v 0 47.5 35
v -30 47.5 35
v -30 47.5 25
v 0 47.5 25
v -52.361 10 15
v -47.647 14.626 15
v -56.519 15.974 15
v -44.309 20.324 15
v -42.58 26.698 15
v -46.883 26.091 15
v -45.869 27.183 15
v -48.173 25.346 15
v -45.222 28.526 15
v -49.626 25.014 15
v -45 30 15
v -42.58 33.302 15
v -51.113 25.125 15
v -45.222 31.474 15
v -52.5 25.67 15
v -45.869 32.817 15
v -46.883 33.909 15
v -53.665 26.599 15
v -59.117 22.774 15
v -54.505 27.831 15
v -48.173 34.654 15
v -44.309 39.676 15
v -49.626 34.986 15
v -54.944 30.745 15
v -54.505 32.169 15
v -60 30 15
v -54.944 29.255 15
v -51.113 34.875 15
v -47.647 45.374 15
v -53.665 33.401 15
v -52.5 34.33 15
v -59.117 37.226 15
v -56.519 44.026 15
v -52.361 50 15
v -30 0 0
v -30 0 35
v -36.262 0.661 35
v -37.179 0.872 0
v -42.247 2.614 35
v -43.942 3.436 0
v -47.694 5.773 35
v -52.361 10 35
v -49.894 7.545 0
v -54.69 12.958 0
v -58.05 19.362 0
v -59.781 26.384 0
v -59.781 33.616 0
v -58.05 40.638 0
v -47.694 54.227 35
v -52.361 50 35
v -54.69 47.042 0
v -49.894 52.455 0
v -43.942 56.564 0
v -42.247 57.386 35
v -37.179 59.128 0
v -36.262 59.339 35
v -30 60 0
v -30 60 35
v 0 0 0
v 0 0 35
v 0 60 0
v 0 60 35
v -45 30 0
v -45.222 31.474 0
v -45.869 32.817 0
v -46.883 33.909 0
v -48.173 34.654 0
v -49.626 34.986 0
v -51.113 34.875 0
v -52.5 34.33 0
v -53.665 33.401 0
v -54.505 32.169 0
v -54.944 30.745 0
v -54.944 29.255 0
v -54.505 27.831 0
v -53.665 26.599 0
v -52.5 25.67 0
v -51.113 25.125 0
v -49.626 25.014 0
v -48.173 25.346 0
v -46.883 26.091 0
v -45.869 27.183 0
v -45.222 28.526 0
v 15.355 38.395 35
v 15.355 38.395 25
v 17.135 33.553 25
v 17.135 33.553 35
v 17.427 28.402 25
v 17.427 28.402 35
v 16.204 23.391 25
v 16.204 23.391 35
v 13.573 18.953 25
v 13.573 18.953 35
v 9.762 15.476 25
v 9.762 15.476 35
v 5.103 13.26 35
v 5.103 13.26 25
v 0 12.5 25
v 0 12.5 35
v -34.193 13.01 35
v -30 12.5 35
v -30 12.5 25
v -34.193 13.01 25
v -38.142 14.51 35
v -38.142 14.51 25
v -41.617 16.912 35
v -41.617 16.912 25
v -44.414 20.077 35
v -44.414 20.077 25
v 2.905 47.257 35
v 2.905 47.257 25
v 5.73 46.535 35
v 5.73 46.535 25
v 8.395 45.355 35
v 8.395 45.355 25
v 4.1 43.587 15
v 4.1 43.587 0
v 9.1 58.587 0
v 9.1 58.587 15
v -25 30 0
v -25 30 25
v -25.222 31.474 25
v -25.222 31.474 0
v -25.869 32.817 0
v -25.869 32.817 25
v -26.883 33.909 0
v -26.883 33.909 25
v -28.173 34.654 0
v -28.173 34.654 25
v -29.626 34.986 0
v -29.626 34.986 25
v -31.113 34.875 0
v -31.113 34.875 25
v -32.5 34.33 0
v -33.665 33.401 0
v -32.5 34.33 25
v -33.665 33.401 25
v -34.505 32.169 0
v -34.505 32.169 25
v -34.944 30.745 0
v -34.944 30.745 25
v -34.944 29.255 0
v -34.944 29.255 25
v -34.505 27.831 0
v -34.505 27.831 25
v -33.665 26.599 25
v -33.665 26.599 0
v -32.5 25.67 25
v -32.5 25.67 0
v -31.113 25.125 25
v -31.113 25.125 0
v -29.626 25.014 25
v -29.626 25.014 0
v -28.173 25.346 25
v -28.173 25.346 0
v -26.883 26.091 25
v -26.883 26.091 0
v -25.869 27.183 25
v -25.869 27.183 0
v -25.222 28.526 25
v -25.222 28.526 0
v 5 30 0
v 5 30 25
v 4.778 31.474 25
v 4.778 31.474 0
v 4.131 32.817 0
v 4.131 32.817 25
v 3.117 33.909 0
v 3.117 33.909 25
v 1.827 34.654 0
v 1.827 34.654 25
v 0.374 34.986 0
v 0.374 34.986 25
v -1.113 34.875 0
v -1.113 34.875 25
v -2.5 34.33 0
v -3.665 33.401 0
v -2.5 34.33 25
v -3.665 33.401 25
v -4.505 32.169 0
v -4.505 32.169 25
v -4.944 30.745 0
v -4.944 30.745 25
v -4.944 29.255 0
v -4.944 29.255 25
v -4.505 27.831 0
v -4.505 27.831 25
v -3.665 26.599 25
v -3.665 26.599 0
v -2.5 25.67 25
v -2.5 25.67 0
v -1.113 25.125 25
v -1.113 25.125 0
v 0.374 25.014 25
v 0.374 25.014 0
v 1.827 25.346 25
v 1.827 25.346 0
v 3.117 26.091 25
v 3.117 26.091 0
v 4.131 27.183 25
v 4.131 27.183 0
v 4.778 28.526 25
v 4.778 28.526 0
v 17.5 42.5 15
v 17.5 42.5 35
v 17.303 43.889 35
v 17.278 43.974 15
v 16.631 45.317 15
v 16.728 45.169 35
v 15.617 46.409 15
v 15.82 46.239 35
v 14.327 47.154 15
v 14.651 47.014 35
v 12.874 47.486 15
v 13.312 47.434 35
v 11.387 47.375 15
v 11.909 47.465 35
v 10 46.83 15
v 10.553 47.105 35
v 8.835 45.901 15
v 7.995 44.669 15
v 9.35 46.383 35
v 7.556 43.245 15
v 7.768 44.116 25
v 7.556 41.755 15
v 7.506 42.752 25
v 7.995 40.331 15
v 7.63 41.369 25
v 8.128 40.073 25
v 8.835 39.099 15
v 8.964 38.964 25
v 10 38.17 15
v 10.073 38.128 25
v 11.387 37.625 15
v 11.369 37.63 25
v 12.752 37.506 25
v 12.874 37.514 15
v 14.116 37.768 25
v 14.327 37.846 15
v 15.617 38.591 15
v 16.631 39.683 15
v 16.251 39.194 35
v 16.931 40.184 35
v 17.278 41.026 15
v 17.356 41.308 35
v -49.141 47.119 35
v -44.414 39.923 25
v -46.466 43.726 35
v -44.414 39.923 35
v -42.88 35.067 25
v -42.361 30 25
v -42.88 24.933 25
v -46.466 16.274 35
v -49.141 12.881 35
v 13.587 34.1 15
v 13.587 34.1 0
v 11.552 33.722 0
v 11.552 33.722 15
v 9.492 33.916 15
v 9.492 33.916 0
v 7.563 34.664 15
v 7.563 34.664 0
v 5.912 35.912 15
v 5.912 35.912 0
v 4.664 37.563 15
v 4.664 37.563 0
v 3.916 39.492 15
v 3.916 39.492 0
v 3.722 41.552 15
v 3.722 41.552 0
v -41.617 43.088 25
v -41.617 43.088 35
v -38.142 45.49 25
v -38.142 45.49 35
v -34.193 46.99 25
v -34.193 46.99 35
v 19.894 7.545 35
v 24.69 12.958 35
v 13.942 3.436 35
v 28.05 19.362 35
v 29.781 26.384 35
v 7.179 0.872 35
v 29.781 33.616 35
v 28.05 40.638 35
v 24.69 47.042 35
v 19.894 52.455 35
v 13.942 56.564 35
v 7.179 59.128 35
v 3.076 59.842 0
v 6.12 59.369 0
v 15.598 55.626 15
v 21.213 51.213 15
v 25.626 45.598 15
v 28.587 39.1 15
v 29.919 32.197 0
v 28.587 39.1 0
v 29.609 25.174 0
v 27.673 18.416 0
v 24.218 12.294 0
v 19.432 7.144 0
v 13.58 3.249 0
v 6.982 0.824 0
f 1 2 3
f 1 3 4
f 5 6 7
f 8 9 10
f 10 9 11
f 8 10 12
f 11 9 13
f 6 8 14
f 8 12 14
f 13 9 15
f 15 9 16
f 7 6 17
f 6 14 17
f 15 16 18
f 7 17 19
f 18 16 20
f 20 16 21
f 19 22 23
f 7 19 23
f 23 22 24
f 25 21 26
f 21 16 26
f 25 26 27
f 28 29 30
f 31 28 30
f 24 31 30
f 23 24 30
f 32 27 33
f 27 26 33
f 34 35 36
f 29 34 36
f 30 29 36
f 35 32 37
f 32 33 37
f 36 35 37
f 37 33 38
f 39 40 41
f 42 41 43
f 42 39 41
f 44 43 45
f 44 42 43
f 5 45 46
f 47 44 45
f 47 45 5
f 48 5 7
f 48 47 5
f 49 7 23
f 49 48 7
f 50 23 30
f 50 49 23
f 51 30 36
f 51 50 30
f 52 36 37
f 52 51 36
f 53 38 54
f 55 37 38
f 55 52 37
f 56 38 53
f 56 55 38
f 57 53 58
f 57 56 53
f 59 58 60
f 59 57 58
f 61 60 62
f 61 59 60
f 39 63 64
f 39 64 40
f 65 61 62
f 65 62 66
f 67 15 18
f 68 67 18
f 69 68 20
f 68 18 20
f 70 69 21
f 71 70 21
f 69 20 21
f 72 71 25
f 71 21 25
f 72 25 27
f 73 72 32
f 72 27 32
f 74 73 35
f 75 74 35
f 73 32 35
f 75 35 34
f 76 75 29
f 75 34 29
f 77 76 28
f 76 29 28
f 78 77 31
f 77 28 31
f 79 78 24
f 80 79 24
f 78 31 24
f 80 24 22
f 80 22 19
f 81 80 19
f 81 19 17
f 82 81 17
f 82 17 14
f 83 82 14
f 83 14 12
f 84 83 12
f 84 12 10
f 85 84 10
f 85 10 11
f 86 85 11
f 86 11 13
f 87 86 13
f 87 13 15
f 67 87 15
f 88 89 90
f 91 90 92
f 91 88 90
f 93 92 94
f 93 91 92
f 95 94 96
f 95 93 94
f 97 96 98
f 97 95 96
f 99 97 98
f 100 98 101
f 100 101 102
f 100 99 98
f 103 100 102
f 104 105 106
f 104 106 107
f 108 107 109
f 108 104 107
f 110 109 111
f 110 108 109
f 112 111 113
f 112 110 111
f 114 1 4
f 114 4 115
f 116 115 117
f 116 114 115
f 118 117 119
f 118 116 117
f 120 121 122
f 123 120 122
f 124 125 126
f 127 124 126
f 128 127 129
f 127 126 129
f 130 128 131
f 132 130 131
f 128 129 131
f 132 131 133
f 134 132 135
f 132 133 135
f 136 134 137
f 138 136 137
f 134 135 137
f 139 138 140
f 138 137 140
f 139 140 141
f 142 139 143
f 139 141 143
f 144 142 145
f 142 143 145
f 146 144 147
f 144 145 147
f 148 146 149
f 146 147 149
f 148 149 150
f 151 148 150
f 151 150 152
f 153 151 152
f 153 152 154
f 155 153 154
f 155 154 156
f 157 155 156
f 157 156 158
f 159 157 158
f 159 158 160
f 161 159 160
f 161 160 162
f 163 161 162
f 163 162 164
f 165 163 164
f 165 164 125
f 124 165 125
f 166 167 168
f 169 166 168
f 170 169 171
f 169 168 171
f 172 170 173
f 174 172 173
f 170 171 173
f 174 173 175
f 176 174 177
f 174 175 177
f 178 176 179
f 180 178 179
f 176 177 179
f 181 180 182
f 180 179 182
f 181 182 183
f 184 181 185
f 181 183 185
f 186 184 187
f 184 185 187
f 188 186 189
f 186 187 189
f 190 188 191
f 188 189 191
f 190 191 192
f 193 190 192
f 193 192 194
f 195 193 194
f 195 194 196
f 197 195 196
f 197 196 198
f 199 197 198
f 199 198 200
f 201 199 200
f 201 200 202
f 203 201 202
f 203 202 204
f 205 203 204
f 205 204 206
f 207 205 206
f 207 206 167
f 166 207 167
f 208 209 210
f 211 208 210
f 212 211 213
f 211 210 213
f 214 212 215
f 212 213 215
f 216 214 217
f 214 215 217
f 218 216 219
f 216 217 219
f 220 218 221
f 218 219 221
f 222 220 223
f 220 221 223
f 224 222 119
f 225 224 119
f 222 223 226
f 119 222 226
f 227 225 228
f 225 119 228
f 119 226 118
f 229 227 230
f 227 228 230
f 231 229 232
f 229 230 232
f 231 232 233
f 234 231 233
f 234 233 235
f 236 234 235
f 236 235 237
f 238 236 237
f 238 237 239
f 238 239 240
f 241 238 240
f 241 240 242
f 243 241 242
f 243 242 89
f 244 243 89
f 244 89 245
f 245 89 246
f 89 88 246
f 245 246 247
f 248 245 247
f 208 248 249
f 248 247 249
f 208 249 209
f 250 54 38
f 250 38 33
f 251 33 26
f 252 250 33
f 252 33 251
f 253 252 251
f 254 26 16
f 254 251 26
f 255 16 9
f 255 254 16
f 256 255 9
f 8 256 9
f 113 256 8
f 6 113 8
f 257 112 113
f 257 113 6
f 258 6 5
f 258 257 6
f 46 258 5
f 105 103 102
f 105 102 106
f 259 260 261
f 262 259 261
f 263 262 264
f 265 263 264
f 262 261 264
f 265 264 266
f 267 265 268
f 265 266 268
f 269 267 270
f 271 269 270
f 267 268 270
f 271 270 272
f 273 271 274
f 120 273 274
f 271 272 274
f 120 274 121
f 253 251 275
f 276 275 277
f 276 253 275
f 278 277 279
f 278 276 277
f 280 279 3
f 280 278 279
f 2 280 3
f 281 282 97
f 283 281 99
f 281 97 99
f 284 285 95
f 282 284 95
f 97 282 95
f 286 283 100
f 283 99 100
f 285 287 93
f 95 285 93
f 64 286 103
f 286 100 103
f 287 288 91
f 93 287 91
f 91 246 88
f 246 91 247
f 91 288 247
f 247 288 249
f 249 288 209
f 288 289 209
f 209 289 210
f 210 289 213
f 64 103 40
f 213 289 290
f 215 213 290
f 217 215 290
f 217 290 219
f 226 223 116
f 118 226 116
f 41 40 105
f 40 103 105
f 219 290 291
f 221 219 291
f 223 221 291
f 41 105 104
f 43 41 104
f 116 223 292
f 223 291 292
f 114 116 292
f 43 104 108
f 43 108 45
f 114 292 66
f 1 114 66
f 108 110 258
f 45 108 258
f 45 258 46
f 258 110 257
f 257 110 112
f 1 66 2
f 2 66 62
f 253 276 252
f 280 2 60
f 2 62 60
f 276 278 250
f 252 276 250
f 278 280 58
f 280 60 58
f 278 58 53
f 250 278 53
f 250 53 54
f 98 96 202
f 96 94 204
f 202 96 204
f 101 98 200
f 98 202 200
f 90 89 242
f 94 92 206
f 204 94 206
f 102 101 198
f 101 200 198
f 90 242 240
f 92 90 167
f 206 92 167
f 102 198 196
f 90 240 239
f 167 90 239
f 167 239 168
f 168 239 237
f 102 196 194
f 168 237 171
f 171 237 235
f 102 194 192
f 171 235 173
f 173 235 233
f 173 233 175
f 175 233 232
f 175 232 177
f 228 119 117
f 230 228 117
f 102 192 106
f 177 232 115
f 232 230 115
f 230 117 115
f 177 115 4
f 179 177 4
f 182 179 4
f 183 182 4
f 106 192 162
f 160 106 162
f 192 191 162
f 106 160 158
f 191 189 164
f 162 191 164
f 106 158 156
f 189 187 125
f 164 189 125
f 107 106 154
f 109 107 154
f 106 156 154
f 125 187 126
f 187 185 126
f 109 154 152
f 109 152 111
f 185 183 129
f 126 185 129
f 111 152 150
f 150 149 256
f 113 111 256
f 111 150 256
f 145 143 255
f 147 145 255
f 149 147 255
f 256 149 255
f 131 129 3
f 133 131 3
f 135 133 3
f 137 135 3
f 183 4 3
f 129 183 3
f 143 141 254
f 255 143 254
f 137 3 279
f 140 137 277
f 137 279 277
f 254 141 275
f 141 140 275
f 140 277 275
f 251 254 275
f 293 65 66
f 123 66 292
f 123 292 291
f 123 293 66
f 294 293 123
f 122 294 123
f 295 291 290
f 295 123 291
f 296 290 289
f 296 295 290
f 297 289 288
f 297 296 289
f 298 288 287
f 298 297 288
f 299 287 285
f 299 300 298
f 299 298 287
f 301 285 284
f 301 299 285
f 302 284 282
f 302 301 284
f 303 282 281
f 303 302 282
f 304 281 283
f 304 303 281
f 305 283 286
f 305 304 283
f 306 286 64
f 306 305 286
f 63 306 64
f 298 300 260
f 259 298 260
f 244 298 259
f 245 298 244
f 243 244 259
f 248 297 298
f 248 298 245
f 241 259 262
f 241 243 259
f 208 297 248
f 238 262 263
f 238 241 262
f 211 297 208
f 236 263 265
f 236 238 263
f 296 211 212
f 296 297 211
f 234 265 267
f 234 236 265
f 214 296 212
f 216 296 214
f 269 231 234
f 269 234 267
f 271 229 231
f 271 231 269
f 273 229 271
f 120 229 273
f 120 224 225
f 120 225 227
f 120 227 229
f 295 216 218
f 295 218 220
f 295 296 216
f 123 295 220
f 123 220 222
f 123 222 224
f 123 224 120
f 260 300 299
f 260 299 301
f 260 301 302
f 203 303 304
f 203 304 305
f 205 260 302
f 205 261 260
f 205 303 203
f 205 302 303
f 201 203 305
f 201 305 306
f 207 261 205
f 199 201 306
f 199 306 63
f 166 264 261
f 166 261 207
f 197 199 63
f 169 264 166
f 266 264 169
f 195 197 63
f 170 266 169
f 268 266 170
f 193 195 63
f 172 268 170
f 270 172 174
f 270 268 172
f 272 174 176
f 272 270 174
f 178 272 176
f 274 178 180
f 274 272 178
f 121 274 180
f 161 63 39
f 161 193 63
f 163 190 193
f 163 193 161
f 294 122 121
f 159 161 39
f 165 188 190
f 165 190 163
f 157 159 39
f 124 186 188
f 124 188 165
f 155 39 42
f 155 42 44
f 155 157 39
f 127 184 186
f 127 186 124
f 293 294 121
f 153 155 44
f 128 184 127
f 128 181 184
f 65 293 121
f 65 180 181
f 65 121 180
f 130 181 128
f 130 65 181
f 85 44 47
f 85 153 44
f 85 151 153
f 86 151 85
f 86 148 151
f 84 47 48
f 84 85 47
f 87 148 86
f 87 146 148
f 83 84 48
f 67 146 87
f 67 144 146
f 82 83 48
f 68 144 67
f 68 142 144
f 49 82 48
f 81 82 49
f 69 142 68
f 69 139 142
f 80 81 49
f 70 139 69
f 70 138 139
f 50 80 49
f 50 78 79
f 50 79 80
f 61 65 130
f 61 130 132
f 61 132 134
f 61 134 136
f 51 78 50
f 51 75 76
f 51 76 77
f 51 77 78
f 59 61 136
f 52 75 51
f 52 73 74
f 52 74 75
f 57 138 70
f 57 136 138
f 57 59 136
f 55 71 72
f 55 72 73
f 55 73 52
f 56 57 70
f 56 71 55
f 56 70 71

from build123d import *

# Parameters (mm, degrees)
BOSS_EXTRUDE1_DEPTH = 35
CUT_EXTRUDE1_DEPTH  = 10
SKETCH4_R           = 5
CUT_EXTRUDE2_DEPTH  = 113
SKETCH5_R           = 5
CUT_EXTRUDE3_DEPTH  = 20
CUT_EXTRUDE4_DEPTH  = 20
SKETCH7_R           = 5
CUT_EXTRUDE5_DEPTH  = 48
CUT_EXTRUDE7_DEPTH  = 15


with BuildPart() as part:
    # Sketch1 → Boss-Extrude1 (new body)
    with BuildSketch(Plane.XY):
        with BuildLine():
            Line((-30, 60), (0, 60))
            ThreePointArc((0, 60), (30, 30), (0, 0))
            Line((0, 0), (-30, 0))
            ThreePointArc((-30, 0), (-60, 30), (-30, 60))
        make_face()
    extrude(amount=BOSS_EXTRUDE1_DEPTH)

    # Sketch2 → Cut-Extrude1 (cut)
    with BuildSketch(Plane.XY.offset(35)):
        with BuildLine():
            Line((-30, 47.5), (0, 47.5))
            ThreePointArc((0, 47.5), (17.5, 30), (0, 12.5))
            Line((0, 12.5), (-30, 12.5))
            ThreePointArc((-30, 12.5), (-47.5, 30), (-30, 47.5))
        make_face()
    extrude(amount=-CUT_EXTRUDE1_DEPTH, mode=Mode.SUBTRACT)

    # Sketch4 → Cut-Extrude2 (cut)
    with BuildSketch(Plane.XY.offset(25)):
        with Locations((-30, 30)):
            Circle(SKETCH4_R)
        with Locations((0, 30)):
            Circle(SKETCH4_R)
    extrude(amount=-CUT_EXTRUDE2_DEPTH, mode=Mode.SUBTRACT)

    # Sketch5 → Cut-Extrude3 (cut)
    with BuildSketch(Plane.XY.offset(35)):
        with Locations((12.5, 42.5)):
            Circle(SKETCH5_R)
    extrude(amount=-CUT_EXTRUDE3_DEPTH, mode=Mode.SUBTRACT)

    # Sketch6 → Cut-Extrude4 (cut)
    with BuildSketch(Plane.XY.offset(35)):
        with BuildLine():
            ThreePointArc((-52.360679775, 50), (-42.360679775, 30), (-52.360679775, 10))
            ThreePointArc((-52.360679775, 10), (-60, 30), (-52.360679775, 50))
        make_face()
    extrude(amount=-CUT_EXTRUDE4_DEPTH, mode=Mode.SUBTRACT)

    # Sketch7 → Cut-Extrude5 (cut)
    with BuildSketch(Plane.XY.offset(15)):
        with Locations((-50, 30)):
            Circle(SKETCH7_R)
    extrude(amount=-CUT_EXTRUDE5_DEPTH, mode=Mode.SUBTRACT)

    # Sketch8 → Cut-Extrude7 (cut)
    with BuildSketch(Plane(origin=(0, 0, 0), x_dir=(-1, 0, 0), z_dir=(0, 0, -1))):
        with BuildLine():
            Line((-4.099774192, 43.586607173), (-9.099774192, 58.586607173))
            ThreePointArc((-9.099774192, 58.586607173), (-21.213203436, 51.213203436), (-28.586607173, 39.099774192))
            Line((-28.586607173, 39.099774192), (-13.586607173, 34.099774192))
            ThreePointArc((-13.586607173, 34.099774192), (-5.911598069, 35.911598069), (-4.099774192, 43.586607173))
        make_face()
    extrude(amount=-CUT_EXTRUDE7_DEPTH, mode=Mode.SUBTRACT)


solid = part.part
